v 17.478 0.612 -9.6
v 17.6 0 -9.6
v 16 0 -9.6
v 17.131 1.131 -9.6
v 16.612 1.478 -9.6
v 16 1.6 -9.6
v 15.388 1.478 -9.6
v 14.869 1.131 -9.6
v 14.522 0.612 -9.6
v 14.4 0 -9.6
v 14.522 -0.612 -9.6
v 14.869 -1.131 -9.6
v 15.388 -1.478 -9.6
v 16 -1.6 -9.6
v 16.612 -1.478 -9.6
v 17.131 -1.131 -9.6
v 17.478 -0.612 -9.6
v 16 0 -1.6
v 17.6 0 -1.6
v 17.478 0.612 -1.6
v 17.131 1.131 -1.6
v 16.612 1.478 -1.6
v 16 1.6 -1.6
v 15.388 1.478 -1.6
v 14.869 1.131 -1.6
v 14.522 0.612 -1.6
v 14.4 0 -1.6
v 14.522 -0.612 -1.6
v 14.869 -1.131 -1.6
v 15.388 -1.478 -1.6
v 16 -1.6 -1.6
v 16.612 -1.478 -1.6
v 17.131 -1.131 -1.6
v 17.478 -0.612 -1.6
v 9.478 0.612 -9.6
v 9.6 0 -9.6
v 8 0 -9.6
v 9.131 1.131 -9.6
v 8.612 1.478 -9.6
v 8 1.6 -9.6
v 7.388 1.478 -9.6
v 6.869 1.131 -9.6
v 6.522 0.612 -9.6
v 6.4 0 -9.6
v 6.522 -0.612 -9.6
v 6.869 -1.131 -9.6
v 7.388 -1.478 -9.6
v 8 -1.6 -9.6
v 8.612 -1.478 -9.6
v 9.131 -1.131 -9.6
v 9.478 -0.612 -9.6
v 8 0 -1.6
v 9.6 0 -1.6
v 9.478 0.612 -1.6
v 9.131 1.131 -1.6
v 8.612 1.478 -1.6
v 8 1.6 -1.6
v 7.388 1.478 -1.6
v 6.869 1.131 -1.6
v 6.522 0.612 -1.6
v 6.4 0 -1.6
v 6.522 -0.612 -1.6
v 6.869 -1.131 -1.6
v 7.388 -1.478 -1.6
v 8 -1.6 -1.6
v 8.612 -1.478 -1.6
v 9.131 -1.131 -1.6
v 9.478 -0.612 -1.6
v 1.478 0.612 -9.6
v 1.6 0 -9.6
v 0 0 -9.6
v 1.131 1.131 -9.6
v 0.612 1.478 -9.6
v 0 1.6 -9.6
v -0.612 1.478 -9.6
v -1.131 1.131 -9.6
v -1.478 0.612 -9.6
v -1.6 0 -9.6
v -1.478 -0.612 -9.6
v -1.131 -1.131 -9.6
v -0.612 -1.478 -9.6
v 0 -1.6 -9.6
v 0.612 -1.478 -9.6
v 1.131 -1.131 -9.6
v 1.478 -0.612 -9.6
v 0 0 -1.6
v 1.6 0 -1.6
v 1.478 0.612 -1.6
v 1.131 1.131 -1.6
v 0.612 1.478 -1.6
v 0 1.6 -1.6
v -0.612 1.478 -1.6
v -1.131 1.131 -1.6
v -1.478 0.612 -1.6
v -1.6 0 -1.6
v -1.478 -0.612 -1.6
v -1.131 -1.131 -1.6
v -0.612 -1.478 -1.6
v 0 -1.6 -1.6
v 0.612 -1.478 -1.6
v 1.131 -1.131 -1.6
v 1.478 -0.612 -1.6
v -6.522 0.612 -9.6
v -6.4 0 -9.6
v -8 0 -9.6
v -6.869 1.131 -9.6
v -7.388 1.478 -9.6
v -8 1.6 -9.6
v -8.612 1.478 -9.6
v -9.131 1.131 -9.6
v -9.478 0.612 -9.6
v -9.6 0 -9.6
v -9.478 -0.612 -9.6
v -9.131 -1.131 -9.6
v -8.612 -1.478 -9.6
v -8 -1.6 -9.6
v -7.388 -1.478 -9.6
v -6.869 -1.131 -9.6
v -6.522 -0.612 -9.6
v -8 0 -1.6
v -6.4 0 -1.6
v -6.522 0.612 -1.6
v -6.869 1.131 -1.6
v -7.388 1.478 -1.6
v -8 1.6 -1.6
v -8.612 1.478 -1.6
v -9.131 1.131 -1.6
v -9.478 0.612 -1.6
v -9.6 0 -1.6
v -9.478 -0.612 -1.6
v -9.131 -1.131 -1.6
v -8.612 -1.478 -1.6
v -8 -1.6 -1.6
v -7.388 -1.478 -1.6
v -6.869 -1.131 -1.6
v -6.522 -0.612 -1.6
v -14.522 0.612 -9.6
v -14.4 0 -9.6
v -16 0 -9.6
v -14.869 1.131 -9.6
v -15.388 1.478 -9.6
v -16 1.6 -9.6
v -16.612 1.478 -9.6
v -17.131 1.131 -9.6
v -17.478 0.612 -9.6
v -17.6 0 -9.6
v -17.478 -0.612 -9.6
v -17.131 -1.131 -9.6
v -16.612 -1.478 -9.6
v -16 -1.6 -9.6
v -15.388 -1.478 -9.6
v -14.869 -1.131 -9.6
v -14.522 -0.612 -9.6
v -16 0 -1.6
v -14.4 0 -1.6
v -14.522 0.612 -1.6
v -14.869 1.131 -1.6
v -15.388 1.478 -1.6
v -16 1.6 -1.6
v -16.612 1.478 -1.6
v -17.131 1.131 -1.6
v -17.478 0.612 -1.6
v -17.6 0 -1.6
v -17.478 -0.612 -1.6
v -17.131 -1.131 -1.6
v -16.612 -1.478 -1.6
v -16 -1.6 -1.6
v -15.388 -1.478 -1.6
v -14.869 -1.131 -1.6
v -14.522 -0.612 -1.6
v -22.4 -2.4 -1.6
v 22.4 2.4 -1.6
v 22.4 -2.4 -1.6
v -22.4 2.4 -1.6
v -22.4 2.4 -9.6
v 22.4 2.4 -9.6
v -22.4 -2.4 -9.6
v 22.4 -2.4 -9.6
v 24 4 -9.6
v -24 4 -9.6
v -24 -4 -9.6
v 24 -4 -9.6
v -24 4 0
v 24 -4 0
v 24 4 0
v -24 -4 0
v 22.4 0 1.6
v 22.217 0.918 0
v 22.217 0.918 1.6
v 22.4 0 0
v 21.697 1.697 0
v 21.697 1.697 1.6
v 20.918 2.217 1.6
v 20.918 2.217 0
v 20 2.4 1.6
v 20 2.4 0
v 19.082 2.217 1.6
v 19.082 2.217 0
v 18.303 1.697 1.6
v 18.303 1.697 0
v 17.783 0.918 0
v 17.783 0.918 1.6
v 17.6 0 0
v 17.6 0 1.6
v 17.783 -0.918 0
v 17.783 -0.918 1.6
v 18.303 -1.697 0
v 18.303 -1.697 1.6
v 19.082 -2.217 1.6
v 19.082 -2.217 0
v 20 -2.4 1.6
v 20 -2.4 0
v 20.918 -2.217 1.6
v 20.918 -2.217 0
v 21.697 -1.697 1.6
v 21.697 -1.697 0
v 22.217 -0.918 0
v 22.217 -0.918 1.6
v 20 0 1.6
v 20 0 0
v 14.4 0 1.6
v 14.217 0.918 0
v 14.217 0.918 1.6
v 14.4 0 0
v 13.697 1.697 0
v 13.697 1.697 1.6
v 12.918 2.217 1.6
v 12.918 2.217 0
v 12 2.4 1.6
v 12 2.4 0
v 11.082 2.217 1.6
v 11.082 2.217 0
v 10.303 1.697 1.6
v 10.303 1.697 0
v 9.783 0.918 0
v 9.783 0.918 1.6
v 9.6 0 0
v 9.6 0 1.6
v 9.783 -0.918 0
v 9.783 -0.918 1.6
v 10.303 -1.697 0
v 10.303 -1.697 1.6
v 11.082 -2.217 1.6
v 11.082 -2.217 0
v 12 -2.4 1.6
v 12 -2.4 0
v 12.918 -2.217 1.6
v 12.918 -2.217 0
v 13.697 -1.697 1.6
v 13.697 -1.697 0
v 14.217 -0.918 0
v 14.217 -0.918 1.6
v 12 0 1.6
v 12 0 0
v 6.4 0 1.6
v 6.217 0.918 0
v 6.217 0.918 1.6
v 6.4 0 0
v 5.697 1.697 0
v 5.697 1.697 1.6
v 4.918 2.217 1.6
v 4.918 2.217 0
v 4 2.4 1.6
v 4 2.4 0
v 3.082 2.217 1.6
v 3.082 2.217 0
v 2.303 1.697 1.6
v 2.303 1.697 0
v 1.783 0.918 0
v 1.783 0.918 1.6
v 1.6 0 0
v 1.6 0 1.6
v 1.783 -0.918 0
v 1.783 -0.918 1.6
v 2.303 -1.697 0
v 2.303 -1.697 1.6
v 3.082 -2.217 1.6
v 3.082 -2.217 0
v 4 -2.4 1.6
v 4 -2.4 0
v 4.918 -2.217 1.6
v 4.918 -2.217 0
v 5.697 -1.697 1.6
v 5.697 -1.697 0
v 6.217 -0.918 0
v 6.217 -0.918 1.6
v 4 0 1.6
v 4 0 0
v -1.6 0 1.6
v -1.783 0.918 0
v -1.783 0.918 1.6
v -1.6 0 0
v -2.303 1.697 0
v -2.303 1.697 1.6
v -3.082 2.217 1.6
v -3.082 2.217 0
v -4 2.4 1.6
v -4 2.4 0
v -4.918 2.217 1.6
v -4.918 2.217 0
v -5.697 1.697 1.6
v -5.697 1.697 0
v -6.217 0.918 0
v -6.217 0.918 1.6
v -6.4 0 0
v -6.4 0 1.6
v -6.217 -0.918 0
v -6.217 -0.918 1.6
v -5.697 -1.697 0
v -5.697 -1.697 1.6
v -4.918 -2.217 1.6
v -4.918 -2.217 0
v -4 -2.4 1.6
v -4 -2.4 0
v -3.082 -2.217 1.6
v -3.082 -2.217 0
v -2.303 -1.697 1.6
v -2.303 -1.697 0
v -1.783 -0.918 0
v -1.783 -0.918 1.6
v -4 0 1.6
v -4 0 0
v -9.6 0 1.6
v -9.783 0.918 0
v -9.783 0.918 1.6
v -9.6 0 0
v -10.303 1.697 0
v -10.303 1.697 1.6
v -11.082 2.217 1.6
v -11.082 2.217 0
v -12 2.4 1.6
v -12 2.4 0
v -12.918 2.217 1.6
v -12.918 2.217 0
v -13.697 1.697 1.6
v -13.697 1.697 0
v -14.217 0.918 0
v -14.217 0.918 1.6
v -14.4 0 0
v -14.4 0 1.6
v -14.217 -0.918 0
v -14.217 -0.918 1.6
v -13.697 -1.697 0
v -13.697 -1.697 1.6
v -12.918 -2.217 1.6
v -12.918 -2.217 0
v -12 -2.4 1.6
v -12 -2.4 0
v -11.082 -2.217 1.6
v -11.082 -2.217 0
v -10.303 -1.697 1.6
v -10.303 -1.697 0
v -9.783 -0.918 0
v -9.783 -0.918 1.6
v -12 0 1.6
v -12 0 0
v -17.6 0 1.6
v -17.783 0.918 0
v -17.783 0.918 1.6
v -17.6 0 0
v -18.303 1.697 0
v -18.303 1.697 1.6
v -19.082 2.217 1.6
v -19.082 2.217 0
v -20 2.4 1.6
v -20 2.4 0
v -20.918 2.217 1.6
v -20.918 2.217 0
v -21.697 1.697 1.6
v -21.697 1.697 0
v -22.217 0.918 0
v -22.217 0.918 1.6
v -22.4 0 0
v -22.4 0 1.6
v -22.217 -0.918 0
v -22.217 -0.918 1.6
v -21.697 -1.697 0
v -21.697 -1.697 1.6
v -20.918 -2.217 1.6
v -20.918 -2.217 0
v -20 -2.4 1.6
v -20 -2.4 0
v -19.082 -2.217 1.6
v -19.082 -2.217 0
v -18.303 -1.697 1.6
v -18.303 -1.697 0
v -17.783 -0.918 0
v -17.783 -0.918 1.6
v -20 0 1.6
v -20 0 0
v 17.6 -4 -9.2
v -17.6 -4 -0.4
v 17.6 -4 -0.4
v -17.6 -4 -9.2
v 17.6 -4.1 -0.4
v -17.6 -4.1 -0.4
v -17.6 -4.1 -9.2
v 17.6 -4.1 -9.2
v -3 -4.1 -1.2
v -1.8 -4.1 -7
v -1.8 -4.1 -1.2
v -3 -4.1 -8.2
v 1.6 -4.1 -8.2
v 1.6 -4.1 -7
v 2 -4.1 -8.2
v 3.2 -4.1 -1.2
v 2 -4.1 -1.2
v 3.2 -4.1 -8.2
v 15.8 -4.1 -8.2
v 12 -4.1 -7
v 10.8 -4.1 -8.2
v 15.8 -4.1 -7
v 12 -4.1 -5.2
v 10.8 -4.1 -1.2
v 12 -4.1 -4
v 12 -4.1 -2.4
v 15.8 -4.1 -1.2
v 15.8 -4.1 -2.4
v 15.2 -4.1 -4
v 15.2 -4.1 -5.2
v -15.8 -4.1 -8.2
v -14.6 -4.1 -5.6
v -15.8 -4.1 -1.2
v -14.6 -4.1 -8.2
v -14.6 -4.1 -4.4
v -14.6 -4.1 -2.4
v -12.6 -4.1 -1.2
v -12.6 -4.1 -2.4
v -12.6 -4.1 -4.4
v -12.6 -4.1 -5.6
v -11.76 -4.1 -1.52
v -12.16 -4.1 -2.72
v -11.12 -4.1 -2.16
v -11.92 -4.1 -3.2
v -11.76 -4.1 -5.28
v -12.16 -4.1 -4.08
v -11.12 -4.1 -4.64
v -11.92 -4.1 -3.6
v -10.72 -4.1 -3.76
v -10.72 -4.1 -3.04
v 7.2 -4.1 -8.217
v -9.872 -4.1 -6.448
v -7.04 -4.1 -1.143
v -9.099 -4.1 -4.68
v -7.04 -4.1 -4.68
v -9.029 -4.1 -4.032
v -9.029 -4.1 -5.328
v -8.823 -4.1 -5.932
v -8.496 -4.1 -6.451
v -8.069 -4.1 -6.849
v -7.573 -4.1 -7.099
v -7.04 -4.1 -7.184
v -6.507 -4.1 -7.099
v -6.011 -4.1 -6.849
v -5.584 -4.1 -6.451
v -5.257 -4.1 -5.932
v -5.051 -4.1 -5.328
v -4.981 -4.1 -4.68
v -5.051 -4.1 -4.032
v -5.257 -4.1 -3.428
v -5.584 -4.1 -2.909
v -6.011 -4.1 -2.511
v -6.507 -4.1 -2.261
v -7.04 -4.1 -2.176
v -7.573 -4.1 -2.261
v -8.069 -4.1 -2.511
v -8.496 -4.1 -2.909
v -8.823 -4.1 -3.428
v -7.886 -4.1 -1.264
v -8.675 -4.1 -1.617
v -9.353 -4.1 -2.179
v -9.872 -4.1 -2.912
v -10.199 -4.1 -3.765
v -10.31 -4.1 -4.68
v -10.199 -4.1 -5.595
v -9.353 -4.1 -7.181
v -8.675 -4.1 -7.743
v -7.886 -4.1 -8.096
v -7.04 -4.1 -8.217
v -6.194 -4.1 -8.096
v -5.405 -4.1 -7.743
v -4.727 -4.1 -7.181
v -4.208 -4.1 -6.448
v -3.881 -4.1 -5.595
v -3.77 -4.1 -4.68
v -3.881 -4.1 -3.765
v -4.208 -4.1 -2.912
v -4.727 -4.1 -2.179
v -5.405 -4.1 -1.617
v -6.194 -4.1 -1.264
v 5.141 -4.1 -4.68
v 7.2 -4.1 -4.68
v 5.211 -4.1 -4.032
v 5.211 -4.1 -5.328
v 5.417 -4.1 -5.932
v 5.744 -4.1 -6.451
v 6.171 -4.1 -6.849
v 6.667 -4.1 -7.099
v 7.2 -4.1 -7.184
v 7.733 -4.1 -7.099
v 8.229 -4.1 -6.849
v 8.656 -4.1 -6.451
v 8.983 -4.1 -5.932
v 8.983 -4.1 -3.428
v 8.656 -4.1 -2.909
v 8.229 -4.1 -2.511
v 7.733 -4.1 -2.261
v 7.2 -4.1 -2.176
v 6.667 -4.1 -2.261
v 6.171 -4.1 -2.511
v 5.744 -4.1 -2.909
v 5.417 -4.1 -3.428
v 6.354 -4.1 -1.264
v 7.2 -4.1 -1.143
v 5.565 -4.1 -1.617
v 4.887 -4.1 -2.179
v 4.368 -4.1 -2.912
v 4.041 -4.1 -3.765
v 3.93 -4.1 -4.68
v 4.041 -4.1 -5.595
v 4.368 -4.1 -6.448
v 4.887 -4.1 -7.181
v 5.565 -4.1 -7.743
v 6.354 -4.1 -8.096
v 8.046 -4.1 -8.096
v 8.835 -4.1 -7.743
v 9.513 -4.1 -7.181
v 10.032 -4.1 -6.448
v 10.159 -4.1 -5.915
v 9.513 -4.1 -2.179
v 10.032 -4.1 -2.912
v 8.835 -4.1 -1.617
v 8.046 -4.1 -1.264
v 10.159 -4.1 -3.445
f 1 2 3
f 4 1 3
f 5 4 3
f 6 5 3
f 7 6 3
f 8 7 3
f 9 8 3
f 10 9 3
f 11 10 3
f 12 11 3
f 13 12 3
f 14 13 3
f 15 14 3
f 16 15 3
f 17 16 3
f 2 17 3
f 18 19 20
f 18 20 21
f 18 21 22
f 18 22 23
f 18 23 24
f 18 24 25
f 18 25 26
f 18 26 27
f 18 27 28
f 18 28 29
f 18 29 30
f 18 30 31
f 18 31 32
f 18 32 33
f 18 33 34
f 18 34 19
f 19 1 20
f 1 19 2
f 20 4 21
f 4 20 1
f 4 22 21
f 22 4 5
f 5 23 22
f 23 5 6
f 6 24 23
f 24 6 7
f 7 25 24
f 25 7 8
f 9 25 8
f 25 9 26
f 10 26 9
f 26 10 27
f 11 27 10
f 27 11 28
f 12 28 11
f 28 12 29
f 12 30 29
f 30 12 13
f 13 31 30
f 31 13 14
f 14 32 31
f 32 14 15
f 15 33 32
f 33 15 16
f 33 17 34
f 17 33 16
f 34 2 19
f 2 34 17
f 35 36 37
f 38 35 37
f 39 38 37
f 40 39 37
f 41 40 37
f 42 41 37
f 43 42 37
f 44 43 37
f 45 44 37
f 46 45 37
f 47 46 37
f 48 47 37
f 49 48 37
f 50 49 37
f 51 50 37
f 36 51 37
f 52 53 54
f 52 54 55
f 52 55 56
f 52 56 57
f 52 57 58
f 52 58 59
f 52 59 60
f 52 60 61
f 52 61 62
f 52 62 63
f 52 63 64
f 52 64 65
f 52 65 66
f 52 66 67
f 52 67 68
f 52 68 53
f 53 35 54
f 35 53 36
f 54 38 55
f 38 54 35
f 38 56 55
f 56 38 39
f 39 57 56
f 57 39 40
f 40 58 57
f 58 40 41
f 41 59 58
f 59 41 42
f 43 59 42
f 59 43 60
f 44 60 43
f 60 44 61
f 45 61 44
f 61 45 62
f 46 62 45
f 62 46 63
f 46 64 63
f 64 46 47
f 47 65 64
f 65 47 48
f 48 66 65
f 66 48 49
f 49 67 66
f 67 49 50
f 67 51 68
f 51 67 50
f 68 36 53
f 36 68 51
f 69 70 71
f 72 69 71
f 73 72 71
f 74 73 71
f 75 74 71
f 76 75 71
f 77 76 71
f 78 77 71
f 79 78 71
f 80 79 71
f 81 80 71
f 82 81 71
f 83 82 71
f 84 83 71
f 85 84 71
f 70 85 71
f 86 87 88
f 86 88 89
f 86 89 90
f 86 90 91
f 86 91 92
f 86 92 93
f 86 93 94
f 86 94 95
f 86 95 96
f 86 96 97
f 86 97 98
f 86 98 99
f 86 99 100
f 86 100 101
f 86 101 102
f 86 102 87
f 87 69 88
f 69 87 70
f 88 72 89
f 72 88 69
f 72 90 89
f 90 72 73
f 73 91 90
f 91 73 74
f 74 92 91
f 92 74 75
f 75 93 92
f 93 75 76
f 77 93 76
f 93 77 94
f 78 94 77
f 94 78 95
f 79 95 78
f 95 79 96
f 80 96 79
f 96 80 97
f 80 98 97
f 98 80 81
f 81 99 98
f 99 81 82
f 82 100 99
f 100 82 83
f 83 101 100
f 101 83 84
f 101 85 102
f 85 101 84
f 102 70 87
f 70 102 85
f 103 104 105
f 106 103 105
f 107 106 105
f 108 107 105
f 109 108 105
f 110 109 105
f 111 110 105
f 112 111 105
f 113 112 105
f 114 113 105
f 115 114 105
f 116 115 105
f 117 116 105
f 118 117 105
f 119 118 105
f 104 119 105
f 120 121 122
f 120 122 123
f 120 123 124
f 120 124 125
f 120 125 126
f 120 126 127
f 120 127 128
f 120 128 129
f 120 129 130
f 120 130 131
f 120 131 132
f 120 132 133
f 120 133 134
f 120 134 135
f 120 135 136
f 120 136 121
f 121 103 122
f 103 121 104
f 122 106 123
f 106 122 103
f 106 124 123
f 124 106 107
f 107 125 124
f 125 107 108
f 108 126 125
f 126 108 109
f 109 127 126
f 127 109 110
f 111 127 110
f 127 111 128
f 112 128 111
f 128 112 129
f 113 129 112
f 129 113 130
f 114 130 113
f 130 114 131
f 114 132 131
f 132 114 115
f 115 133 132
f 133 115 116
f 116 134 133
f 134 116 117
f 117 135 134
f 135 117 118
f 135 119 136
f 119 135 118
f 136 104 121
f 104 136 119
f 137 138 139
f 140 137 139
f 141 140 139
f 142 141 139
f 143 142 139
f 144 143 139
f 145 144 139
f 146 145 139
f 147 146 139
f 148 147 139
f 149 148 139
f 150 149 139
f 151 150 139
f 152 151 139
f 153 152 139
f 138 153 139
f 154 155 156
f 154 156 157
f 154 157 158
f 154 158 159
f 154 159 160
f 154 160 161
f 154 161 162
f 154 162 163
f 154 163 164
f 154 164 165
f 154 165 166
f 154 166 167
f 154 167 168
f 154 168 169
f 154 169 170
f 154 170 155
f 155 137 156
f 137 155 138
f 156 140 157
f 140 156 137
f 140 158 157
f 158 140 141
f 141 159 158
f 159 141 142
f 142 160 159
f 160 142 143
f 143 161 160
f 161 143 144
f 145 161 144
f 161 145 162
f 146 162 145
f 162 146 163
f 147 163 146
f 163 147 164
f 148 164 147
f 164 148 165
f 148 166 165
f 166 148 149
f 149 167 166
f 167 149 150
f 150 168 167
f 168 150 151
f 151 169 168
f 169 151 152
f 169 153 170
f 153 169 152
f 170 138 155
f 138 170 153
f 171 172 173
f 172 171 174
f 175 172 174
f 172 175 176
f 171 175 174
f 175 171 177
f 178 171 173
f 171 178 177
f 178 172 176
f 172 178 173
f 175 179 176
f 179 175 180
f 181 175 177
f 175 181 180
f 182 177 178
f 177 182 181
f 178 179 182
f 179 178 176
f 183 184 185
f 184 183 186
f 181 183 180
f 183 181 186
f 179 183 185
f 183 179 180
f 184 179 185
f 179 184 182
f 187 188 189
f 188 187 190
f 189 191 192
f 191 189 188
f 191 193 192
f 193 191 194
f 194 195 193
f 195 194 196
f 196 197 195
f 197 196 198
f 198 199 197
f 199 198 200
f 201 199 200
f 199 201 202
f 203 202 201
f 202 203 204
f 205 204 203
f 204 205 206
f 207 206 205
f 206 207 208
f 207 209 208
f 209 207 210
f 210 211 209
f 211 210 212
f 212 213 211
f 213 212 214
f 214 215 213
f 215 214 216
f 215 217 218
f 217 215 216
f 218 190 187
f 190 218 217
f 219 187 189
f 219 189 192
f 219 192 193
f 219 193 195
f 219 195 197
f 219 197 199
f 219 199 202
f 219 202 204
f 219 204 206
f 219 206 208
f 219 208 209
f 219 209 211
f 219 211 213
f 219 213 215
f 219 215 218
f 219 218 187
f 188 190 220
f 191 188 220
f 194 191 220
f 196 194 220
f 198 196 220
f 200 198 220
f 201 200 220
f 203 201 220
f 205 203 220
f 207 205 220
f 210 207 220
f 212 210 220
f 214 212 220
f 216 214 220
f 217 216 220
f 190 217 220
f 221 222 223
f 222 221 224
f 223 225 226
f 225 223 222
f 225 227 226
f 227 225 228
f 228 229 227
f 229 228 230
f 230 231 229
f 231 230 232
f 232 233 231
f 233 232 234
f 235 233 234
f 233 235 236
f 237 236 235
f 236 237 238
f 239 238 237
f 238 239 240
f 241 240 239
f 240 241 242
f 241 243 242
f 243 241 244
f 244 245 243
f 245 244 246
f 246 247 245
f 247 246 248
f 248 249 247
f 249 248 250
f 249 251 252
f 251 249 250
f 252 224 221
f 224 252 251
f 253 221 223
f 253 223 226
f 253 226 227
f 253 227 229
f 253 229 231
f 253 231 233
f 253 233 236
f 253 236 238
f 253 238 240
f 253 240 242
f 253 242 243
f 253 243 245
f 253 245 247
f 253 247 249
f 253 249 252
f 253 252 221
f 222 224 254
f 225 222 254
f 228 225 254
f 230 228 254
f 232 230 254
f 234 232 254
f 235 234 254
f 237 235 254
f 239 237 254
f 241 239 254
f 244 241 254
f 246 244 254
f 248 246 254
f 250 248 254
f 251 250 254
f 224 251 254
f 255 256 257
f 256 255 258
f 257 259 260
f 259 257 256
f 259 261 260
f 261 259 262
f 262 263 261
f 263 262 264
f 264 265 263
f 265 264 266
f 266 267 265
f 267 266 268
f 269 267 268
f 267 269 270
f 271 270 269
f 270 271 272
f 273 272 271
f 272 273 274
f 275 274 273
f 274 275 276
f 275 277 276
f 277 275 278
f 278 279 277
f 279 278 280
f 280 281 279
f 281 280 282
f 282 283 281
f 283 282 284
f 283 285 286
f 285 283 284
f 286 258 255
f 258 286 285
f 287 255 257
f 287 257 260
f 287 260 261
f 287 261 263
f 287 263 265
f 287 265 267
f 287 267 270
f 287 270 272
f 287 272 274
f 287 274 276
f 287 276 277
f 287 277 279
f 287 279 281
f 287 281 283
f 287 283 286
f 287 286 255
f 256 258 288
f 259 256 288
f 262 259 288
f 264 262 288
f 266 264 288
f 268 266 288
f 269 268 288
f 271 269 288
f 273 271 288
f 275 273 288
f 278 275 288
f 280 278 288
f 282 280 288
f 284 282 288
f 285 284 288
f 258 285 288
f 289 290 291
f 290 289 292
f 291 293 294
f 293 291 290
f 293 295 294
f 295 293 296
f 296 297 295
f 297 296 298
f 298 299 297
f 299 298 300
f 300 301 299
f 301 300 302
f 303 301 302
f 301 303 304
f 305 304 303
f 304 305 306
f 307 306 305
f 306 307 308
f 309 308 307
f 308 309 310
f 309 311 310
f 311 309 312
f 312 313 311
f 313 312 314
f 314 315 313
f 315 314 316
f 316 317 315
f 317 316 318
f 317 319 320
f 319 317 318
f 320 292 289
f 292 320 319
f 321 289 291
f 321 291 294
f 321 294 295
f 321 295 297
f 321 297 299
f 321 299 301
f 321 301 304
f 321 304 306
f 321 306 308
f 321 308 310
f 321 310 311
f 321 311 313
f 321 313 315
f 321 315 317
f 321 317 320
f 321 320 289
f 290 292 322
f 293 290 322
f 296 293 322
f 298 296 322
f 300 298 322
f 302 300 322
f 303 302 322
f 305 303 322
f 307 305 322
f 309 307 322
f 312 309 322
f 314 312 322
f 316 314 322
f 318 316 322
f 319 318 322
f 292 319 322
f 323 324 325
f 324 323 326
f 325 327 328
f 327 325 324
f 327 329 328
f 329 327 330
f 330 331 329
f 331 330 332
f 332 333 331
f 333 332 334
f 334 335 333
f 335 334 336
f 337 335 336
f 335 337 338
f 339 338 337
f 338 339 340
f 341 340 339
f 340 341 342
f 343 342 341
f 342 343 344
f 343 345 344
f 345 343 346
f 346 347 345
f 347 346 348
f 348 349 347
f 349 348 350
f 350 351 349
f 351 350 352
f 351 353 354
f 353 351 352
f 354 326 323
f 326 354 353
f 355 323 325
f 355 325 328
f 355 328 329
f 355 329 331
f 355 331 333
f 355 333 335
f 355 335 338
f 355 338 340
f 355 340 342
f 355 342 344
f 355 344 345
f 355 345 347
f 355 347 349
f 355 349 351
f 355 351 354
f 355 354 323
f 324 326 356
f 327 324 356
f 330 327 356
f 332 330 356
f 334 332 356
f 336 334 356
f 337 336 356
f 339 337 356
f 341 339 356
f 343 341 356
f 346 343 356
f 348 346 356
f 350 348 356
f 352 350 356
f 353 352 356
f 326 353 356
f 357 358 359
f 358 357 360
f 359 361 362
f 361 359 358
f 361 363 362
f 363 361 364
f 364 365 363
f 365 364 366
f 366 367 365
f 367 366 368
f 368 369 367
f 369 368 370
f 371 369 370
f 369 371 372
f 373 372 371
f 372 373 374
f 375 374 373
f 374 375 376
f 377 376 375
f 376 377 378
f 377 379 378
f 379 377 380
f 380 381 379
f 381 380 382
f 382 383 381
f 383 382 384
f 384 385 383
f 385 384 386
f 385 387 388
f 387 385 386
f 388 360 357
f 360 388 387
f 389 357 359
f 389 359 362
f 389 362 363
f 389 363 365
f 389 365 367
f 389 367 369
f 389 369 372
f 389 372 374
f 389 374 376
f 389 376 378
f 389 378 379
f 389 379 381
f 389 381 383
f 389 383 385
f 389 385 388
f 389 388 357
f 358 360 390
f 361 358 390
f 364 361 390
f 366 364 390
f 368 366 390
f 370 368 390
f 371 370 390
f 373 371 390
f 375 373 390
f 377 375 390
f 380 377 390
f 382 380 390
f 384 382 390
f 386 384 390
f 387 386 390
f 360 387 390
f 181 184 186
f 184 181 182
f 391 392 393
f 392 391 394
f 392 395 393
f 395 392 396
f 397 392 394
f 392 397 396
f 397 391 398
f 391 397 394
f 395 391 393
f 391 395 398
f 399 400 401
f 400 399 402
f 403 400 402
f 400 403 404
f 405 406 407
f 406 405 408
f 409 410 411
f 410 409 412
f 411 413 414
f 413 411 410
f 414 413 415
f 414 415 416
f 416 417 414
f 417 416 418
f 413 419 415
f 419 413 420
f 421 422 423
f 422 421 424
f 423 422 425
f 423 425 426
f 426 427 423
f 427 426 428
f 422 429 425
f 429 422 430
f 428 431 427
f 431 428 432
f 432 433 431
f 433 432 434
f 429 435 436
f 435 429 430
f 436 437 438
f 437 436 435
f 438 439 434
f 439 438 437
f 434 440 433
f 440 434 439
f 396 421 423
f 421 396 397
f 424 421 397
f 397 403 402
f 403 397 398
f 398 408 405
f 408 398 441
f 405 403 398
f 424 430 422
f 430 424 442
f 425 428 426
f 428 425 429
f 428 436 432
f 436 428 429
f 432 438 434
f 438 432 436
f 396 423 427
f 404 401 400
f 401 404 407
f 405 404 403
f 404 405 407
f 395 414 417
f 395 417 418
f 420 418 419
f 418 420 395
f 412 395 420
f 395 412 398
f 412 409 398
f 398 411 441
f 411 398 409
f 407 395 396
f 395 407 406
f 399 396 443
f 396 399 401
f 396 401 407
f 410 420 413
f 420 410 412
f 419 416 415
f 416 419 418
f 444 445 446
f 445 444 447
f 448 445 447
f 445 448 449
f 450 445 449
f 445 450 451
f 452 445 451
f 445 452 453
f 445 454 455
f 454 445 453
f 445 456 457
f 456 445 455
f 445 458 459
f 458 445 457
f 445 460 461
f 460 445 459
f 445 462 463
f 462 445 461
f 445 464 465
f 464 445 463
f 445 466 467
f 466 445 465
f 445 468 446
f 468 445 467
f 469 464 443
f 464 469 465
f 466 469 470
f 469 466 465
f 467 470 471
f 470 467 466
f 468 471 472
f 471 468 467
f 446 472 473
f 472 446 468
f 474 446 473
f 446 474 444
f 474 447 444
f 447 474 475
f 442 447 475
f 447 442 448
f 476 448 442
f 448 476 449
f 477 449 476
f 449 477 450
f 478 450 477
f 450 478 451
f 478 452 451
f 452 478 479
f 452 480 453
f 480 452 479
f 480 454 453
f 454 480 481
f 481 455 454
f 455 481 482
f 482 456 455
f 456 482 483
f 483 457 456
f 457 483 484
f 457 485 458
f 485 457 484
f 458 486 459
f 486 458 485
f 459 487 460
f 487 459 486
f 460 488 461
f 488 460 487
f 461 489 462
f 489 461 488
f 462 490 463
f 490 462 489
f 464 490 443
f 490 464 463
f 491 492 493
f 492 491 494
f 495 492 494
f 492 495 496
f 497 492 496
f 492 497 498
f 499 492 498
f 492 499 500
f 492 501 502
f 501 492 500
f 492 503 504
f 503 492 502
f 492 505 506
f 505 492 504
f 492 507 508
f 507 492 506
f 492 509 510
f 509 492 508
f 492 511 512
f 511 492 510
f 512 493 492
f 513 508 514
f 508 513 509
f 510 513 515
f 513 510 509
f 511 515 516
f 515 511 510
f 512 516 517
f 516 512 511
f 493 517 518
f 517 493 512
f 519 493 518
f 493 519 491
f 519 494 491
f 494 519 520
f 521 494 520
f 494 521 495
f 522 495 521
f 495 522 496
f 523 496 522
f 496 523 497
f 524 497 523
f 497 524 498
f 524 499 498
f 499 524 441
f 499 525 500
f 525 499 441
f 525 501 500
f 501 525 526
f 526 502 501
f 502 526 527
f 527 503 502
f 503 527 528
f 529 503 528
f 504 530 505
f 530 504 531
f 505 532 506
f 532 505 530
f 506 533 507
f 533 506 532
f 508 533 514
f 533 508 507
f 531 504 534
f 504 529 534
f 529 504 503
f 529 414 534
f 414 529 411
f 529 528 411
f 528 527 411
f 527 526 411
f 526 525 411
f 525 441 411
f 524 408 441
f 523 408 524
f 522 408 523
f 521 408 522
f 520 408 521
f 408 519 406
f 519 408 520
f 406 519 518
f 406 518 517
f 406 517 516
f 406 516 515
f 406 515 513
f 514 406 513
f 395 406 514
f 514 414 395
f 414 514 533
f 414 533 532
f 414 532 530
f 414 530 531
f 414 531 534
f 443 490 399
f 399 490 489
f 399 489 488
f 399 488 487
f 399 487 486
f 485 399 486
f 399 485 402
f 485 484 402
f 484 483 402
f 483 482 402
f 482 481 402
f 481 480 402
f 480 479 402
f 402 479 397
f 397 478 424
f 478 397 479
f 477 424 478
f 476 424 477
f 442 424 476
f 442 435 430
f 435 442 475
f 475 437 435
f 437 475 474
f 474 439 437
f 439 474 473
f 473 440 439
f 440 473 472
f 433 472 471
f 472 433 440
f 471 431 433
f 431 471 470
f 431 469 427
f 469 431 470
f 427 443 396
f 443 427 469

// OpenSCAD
use <../lib.scad>
use <3009.scad>
use <820671b.scad>
function ldraw_lib__3009d0n() = [
// 0 Brick  1 x  6 with White "POLICE" Sticker
// 0 Name: 3009d0n.dat
// 0 Author: Takeshi Takahashi [RainbowDolphin]
// 0 !LDRAW_ORG Shortcut UPDATE 2025-03
// 0 !LICENSE Licensed under CC BY 4.0 : see CAreadme.txt
// 
// 0 BFC CERTIFY CCW
  [0,"BFC","CERTIFY"],
  [0,"BFC","CCW"],
// 
// 0 !CATEGORY Sticker Shortcut
// 0 !KEYWORDS boat, Bricklink 3009pb062, Pier police, Set 6540, ship
// 
// 0 !HISTORY 2025-03-30 [OrionP] Official Update 2025-03
// 
// 1 16 0 0 0 1 0 0 0 1 0 0 0 1 3009.dat
  [1,16,0,0,0,1,0,0,0,1,0,0,0,1, ldraw_lib__3009()],
// 1 16 0 12 -10 1 0 0 0 0 -1 0 1 0 820671b.dat
  [1,16,0,12,-10,1,0,0,0,0,-1,0,1,0, ldraw_lib__820671b()],
];
module ldraw_lib__3009d0n(step=0, col=false, unit=2/5, alt=false, line=0.2, solid=!$preview)
    makepoly(ldraw_lib__3009d0n(), step=step, col=col, unit=unit, alt=alt, line=line, solid=solid);
ldraw_lib__3009d0n(line=0.2);
